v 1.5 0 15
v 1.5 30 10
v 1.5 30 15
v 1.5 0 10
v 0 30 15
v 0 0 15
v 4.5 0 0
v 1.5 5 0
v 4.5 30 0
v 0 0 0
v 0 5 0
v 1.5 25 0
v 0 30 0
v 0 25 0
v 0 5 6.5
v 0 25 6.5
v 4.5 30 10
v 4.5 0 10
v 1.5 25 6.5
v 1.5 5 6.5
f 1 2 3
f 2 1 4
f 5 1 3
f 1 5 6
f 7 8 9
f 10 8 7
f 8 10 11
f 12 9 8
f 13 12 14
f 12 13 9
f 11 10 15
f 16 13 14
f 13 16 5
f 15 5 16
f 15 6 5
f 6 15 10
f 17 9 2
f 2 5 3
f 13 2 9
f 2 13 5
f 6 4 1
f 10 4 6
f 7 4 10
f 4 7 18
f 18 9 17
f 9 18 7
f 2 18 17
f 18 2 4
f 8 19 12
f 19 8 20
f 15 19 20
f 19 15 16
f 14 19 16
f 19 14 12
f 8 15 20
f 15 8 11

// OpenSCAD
clip_width = 30; //How wide you want the clips to be.
glass_thickness = 3; //Thickness of your glass.
glass_y_dimension = 310; //Length of your glass bed from front to back

difference(){
union() {
    cube(size = [1.5,clip_width,325-glass_y_dimension], center = false );
translate([1.5,0,0])
    cube(size = [glass_thickness,clip_width,320-glass_y_dimension], center = false);
}
translate([0,(clip_width-20)/2,0])
    cube(size = [glass_thickness-1.5,20,6.5], center = false);
}
